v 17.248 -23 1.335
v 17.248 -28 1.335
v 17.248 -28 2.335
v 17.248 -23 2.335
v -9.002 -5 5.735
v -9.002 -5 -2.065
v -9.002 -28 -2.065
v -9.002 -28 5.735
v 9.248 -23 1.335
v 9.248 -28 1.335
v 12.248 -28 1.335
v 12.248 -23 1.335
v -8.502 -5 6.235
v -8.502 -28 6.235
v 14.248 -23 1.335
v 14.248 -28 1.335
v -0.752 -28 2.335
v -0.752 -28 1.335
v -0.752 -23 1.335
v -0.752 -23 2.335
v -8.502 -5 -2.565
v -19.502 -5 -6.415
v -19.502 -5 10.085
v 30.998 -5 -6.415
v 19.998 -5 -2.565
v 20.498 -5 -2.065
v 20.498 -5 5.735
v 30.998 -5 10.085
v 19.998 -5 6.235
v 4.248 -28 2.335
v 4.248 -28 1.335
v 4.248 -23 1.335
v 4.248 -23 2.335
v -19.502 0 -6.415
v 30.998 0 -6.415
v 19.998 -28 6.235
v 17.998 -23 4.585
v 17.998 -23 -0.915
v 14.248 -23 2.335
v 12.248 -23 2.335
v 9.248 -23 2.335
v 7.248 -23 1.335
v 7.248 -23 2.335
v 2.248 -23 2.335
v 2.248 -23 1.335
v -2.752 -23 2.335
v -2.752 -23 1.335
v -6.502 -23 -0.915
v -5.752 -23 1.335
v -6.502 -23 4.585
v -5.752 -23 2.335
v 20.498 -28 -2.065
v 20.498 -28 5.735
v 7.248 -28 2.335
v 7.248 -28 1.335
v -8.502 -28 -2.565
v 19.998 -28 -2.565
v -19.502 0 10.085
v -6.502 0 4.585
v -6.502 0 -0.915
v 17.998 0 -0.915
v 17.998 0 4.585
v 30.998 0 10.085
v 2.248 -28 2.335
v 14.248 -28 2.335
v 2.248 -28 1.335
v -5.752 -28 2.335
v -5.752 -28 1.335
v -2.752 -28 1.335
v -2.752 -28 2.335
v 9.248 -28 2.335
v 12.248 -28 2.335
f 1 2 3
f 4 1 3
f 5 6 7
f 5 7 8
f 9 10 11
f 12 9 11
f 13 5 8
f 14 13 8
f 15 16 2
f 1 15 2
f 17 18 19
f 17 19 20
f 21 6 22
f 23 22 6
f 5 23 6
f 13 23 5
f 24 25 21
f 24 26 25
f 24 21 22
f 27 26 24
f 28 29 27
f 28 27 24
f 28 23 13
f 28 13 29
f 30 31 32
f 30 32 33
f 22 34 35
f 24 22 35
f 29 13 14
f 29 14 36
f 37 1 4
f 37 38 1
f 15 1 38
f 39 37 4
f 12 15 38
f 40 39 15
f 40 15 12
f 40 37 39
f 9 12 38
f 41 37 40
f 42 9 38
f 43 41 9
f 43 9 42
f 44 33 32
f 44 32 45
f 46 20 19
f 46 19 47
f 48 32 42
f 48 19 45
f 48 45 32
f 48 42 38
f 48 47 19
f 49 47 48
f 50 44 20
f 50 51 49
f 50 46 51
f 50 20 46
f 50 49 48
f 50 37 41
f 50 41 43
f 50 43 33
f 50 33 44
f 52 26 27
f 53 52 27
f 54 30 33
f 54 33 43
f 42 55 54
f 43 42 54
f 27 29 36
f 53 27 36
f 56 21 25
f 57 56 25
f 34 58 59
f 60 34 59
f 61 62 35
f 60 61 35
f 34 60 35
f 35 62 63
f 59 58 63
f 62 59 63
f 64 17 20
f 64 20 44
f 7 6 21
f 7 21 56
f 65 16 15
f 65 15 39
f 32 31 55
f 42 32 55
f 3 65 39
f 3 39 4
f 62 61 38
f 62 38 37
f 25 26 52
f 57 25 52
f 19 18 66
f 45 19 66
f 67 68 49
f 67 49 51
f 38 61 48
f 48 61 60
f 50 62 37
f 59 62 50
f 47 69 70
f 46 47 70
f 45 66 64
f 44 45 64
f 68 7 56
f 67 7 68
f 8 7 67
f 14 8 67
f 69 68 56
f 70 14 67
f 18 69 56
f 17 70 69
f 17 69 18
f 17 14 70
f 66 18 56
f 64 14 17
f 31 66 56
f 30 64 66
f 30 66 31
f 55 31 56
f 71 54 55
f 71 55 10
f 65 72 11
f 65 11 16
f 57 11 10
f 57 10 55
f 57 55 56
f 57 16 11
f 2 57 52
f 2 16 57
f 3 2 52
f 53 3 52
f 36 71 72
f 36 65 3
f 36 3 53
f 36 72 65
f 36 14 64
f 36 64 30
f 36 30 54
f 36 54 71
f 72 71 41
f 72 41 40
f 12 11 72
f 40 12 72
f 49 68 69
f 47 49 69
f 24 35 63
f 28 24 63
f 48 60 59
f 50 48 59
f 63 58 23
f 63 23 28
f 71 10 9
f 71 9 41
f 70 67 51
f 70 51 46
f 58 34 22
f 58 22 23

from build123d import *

# Parameters (mm, degrees)
F0_W     = 50.5
F0_H     = 16.5
F1_DEPTH = 5
F2_W     = 29.5
F2_H     = 8.8
F3_DEPTH = 23
F4_W     = 3
F4_H     = 1
F5_DEPTH = 28
F6_SIZE  = 0.5
F7_W     = 24.5
F7_H     = 5.5
F8_DEPTH = 23


with BuildPart() as f1:
    # F0 (on Front) → F1 (new body)
    with BuildSketch(Plane.XZ):
        with Locations((5.748162, 1.834772)):
            Rectangle(F0_W, F0_H)
    extrude(amount=F1_DEPTH)

    # F2 (on face) → F3 (join)
    with BuildSketch(Plane.XZ.offset(5)):
        with Locations((5.748162, 1.834772)):
            Rectangle(F2_W, F2_H)
    extrude(amount=F3_DEPTH)

    # F4 (on face) → F5 (cut)
    with BuildSketch(Plane.XZ.offset(28)):
        with Locations((-4.251838, 1.834772)):
            Rectangle(F4_W, F4_H)
        with Locations((0.748162, 1.834772)):
            Rectangle(F4_W, F4_H)
        with Locations((5.748162, 1.834772)):
            Rectangle(F4_W, F4_H)
        with Locations((10.748162, 1.834772)):
            Rectangle(F4_W, F4_H)
        with Locations((15.748162, 1.834772)):
            Rectangle(F4_W, F4_H)
    extrude(amount=-F5_DEPTH, mode=Mode.SUBTRACT)

    # F6
    f6_edges = [f1.edges().sort_by_distance(p)[0] for p in [
        (20.498162, -16.5, 6.234772),
        (-9.001838, -16.5, 6.234772),
        (20.498162, -16.5, -2.565228),
        (-9.001838, -16.5, -2.565228),
    ]]
    chamfer(f6_edges, length=F6_SIZE)

    # F7 (on face) → F8 (cut)
    with BuildSketch(Plane(origin=(0, 0, 0), x_dir=(-1, 0, 0), z_dir=(0, 1, 0))):
        with Locations((-5.748162, 1.834772)):
            Rectangle(F7_W, F7_H)
    extrude(amount=-F8_DEPTH, mode=Mode.SUBTRACT)


solid = f1.part
